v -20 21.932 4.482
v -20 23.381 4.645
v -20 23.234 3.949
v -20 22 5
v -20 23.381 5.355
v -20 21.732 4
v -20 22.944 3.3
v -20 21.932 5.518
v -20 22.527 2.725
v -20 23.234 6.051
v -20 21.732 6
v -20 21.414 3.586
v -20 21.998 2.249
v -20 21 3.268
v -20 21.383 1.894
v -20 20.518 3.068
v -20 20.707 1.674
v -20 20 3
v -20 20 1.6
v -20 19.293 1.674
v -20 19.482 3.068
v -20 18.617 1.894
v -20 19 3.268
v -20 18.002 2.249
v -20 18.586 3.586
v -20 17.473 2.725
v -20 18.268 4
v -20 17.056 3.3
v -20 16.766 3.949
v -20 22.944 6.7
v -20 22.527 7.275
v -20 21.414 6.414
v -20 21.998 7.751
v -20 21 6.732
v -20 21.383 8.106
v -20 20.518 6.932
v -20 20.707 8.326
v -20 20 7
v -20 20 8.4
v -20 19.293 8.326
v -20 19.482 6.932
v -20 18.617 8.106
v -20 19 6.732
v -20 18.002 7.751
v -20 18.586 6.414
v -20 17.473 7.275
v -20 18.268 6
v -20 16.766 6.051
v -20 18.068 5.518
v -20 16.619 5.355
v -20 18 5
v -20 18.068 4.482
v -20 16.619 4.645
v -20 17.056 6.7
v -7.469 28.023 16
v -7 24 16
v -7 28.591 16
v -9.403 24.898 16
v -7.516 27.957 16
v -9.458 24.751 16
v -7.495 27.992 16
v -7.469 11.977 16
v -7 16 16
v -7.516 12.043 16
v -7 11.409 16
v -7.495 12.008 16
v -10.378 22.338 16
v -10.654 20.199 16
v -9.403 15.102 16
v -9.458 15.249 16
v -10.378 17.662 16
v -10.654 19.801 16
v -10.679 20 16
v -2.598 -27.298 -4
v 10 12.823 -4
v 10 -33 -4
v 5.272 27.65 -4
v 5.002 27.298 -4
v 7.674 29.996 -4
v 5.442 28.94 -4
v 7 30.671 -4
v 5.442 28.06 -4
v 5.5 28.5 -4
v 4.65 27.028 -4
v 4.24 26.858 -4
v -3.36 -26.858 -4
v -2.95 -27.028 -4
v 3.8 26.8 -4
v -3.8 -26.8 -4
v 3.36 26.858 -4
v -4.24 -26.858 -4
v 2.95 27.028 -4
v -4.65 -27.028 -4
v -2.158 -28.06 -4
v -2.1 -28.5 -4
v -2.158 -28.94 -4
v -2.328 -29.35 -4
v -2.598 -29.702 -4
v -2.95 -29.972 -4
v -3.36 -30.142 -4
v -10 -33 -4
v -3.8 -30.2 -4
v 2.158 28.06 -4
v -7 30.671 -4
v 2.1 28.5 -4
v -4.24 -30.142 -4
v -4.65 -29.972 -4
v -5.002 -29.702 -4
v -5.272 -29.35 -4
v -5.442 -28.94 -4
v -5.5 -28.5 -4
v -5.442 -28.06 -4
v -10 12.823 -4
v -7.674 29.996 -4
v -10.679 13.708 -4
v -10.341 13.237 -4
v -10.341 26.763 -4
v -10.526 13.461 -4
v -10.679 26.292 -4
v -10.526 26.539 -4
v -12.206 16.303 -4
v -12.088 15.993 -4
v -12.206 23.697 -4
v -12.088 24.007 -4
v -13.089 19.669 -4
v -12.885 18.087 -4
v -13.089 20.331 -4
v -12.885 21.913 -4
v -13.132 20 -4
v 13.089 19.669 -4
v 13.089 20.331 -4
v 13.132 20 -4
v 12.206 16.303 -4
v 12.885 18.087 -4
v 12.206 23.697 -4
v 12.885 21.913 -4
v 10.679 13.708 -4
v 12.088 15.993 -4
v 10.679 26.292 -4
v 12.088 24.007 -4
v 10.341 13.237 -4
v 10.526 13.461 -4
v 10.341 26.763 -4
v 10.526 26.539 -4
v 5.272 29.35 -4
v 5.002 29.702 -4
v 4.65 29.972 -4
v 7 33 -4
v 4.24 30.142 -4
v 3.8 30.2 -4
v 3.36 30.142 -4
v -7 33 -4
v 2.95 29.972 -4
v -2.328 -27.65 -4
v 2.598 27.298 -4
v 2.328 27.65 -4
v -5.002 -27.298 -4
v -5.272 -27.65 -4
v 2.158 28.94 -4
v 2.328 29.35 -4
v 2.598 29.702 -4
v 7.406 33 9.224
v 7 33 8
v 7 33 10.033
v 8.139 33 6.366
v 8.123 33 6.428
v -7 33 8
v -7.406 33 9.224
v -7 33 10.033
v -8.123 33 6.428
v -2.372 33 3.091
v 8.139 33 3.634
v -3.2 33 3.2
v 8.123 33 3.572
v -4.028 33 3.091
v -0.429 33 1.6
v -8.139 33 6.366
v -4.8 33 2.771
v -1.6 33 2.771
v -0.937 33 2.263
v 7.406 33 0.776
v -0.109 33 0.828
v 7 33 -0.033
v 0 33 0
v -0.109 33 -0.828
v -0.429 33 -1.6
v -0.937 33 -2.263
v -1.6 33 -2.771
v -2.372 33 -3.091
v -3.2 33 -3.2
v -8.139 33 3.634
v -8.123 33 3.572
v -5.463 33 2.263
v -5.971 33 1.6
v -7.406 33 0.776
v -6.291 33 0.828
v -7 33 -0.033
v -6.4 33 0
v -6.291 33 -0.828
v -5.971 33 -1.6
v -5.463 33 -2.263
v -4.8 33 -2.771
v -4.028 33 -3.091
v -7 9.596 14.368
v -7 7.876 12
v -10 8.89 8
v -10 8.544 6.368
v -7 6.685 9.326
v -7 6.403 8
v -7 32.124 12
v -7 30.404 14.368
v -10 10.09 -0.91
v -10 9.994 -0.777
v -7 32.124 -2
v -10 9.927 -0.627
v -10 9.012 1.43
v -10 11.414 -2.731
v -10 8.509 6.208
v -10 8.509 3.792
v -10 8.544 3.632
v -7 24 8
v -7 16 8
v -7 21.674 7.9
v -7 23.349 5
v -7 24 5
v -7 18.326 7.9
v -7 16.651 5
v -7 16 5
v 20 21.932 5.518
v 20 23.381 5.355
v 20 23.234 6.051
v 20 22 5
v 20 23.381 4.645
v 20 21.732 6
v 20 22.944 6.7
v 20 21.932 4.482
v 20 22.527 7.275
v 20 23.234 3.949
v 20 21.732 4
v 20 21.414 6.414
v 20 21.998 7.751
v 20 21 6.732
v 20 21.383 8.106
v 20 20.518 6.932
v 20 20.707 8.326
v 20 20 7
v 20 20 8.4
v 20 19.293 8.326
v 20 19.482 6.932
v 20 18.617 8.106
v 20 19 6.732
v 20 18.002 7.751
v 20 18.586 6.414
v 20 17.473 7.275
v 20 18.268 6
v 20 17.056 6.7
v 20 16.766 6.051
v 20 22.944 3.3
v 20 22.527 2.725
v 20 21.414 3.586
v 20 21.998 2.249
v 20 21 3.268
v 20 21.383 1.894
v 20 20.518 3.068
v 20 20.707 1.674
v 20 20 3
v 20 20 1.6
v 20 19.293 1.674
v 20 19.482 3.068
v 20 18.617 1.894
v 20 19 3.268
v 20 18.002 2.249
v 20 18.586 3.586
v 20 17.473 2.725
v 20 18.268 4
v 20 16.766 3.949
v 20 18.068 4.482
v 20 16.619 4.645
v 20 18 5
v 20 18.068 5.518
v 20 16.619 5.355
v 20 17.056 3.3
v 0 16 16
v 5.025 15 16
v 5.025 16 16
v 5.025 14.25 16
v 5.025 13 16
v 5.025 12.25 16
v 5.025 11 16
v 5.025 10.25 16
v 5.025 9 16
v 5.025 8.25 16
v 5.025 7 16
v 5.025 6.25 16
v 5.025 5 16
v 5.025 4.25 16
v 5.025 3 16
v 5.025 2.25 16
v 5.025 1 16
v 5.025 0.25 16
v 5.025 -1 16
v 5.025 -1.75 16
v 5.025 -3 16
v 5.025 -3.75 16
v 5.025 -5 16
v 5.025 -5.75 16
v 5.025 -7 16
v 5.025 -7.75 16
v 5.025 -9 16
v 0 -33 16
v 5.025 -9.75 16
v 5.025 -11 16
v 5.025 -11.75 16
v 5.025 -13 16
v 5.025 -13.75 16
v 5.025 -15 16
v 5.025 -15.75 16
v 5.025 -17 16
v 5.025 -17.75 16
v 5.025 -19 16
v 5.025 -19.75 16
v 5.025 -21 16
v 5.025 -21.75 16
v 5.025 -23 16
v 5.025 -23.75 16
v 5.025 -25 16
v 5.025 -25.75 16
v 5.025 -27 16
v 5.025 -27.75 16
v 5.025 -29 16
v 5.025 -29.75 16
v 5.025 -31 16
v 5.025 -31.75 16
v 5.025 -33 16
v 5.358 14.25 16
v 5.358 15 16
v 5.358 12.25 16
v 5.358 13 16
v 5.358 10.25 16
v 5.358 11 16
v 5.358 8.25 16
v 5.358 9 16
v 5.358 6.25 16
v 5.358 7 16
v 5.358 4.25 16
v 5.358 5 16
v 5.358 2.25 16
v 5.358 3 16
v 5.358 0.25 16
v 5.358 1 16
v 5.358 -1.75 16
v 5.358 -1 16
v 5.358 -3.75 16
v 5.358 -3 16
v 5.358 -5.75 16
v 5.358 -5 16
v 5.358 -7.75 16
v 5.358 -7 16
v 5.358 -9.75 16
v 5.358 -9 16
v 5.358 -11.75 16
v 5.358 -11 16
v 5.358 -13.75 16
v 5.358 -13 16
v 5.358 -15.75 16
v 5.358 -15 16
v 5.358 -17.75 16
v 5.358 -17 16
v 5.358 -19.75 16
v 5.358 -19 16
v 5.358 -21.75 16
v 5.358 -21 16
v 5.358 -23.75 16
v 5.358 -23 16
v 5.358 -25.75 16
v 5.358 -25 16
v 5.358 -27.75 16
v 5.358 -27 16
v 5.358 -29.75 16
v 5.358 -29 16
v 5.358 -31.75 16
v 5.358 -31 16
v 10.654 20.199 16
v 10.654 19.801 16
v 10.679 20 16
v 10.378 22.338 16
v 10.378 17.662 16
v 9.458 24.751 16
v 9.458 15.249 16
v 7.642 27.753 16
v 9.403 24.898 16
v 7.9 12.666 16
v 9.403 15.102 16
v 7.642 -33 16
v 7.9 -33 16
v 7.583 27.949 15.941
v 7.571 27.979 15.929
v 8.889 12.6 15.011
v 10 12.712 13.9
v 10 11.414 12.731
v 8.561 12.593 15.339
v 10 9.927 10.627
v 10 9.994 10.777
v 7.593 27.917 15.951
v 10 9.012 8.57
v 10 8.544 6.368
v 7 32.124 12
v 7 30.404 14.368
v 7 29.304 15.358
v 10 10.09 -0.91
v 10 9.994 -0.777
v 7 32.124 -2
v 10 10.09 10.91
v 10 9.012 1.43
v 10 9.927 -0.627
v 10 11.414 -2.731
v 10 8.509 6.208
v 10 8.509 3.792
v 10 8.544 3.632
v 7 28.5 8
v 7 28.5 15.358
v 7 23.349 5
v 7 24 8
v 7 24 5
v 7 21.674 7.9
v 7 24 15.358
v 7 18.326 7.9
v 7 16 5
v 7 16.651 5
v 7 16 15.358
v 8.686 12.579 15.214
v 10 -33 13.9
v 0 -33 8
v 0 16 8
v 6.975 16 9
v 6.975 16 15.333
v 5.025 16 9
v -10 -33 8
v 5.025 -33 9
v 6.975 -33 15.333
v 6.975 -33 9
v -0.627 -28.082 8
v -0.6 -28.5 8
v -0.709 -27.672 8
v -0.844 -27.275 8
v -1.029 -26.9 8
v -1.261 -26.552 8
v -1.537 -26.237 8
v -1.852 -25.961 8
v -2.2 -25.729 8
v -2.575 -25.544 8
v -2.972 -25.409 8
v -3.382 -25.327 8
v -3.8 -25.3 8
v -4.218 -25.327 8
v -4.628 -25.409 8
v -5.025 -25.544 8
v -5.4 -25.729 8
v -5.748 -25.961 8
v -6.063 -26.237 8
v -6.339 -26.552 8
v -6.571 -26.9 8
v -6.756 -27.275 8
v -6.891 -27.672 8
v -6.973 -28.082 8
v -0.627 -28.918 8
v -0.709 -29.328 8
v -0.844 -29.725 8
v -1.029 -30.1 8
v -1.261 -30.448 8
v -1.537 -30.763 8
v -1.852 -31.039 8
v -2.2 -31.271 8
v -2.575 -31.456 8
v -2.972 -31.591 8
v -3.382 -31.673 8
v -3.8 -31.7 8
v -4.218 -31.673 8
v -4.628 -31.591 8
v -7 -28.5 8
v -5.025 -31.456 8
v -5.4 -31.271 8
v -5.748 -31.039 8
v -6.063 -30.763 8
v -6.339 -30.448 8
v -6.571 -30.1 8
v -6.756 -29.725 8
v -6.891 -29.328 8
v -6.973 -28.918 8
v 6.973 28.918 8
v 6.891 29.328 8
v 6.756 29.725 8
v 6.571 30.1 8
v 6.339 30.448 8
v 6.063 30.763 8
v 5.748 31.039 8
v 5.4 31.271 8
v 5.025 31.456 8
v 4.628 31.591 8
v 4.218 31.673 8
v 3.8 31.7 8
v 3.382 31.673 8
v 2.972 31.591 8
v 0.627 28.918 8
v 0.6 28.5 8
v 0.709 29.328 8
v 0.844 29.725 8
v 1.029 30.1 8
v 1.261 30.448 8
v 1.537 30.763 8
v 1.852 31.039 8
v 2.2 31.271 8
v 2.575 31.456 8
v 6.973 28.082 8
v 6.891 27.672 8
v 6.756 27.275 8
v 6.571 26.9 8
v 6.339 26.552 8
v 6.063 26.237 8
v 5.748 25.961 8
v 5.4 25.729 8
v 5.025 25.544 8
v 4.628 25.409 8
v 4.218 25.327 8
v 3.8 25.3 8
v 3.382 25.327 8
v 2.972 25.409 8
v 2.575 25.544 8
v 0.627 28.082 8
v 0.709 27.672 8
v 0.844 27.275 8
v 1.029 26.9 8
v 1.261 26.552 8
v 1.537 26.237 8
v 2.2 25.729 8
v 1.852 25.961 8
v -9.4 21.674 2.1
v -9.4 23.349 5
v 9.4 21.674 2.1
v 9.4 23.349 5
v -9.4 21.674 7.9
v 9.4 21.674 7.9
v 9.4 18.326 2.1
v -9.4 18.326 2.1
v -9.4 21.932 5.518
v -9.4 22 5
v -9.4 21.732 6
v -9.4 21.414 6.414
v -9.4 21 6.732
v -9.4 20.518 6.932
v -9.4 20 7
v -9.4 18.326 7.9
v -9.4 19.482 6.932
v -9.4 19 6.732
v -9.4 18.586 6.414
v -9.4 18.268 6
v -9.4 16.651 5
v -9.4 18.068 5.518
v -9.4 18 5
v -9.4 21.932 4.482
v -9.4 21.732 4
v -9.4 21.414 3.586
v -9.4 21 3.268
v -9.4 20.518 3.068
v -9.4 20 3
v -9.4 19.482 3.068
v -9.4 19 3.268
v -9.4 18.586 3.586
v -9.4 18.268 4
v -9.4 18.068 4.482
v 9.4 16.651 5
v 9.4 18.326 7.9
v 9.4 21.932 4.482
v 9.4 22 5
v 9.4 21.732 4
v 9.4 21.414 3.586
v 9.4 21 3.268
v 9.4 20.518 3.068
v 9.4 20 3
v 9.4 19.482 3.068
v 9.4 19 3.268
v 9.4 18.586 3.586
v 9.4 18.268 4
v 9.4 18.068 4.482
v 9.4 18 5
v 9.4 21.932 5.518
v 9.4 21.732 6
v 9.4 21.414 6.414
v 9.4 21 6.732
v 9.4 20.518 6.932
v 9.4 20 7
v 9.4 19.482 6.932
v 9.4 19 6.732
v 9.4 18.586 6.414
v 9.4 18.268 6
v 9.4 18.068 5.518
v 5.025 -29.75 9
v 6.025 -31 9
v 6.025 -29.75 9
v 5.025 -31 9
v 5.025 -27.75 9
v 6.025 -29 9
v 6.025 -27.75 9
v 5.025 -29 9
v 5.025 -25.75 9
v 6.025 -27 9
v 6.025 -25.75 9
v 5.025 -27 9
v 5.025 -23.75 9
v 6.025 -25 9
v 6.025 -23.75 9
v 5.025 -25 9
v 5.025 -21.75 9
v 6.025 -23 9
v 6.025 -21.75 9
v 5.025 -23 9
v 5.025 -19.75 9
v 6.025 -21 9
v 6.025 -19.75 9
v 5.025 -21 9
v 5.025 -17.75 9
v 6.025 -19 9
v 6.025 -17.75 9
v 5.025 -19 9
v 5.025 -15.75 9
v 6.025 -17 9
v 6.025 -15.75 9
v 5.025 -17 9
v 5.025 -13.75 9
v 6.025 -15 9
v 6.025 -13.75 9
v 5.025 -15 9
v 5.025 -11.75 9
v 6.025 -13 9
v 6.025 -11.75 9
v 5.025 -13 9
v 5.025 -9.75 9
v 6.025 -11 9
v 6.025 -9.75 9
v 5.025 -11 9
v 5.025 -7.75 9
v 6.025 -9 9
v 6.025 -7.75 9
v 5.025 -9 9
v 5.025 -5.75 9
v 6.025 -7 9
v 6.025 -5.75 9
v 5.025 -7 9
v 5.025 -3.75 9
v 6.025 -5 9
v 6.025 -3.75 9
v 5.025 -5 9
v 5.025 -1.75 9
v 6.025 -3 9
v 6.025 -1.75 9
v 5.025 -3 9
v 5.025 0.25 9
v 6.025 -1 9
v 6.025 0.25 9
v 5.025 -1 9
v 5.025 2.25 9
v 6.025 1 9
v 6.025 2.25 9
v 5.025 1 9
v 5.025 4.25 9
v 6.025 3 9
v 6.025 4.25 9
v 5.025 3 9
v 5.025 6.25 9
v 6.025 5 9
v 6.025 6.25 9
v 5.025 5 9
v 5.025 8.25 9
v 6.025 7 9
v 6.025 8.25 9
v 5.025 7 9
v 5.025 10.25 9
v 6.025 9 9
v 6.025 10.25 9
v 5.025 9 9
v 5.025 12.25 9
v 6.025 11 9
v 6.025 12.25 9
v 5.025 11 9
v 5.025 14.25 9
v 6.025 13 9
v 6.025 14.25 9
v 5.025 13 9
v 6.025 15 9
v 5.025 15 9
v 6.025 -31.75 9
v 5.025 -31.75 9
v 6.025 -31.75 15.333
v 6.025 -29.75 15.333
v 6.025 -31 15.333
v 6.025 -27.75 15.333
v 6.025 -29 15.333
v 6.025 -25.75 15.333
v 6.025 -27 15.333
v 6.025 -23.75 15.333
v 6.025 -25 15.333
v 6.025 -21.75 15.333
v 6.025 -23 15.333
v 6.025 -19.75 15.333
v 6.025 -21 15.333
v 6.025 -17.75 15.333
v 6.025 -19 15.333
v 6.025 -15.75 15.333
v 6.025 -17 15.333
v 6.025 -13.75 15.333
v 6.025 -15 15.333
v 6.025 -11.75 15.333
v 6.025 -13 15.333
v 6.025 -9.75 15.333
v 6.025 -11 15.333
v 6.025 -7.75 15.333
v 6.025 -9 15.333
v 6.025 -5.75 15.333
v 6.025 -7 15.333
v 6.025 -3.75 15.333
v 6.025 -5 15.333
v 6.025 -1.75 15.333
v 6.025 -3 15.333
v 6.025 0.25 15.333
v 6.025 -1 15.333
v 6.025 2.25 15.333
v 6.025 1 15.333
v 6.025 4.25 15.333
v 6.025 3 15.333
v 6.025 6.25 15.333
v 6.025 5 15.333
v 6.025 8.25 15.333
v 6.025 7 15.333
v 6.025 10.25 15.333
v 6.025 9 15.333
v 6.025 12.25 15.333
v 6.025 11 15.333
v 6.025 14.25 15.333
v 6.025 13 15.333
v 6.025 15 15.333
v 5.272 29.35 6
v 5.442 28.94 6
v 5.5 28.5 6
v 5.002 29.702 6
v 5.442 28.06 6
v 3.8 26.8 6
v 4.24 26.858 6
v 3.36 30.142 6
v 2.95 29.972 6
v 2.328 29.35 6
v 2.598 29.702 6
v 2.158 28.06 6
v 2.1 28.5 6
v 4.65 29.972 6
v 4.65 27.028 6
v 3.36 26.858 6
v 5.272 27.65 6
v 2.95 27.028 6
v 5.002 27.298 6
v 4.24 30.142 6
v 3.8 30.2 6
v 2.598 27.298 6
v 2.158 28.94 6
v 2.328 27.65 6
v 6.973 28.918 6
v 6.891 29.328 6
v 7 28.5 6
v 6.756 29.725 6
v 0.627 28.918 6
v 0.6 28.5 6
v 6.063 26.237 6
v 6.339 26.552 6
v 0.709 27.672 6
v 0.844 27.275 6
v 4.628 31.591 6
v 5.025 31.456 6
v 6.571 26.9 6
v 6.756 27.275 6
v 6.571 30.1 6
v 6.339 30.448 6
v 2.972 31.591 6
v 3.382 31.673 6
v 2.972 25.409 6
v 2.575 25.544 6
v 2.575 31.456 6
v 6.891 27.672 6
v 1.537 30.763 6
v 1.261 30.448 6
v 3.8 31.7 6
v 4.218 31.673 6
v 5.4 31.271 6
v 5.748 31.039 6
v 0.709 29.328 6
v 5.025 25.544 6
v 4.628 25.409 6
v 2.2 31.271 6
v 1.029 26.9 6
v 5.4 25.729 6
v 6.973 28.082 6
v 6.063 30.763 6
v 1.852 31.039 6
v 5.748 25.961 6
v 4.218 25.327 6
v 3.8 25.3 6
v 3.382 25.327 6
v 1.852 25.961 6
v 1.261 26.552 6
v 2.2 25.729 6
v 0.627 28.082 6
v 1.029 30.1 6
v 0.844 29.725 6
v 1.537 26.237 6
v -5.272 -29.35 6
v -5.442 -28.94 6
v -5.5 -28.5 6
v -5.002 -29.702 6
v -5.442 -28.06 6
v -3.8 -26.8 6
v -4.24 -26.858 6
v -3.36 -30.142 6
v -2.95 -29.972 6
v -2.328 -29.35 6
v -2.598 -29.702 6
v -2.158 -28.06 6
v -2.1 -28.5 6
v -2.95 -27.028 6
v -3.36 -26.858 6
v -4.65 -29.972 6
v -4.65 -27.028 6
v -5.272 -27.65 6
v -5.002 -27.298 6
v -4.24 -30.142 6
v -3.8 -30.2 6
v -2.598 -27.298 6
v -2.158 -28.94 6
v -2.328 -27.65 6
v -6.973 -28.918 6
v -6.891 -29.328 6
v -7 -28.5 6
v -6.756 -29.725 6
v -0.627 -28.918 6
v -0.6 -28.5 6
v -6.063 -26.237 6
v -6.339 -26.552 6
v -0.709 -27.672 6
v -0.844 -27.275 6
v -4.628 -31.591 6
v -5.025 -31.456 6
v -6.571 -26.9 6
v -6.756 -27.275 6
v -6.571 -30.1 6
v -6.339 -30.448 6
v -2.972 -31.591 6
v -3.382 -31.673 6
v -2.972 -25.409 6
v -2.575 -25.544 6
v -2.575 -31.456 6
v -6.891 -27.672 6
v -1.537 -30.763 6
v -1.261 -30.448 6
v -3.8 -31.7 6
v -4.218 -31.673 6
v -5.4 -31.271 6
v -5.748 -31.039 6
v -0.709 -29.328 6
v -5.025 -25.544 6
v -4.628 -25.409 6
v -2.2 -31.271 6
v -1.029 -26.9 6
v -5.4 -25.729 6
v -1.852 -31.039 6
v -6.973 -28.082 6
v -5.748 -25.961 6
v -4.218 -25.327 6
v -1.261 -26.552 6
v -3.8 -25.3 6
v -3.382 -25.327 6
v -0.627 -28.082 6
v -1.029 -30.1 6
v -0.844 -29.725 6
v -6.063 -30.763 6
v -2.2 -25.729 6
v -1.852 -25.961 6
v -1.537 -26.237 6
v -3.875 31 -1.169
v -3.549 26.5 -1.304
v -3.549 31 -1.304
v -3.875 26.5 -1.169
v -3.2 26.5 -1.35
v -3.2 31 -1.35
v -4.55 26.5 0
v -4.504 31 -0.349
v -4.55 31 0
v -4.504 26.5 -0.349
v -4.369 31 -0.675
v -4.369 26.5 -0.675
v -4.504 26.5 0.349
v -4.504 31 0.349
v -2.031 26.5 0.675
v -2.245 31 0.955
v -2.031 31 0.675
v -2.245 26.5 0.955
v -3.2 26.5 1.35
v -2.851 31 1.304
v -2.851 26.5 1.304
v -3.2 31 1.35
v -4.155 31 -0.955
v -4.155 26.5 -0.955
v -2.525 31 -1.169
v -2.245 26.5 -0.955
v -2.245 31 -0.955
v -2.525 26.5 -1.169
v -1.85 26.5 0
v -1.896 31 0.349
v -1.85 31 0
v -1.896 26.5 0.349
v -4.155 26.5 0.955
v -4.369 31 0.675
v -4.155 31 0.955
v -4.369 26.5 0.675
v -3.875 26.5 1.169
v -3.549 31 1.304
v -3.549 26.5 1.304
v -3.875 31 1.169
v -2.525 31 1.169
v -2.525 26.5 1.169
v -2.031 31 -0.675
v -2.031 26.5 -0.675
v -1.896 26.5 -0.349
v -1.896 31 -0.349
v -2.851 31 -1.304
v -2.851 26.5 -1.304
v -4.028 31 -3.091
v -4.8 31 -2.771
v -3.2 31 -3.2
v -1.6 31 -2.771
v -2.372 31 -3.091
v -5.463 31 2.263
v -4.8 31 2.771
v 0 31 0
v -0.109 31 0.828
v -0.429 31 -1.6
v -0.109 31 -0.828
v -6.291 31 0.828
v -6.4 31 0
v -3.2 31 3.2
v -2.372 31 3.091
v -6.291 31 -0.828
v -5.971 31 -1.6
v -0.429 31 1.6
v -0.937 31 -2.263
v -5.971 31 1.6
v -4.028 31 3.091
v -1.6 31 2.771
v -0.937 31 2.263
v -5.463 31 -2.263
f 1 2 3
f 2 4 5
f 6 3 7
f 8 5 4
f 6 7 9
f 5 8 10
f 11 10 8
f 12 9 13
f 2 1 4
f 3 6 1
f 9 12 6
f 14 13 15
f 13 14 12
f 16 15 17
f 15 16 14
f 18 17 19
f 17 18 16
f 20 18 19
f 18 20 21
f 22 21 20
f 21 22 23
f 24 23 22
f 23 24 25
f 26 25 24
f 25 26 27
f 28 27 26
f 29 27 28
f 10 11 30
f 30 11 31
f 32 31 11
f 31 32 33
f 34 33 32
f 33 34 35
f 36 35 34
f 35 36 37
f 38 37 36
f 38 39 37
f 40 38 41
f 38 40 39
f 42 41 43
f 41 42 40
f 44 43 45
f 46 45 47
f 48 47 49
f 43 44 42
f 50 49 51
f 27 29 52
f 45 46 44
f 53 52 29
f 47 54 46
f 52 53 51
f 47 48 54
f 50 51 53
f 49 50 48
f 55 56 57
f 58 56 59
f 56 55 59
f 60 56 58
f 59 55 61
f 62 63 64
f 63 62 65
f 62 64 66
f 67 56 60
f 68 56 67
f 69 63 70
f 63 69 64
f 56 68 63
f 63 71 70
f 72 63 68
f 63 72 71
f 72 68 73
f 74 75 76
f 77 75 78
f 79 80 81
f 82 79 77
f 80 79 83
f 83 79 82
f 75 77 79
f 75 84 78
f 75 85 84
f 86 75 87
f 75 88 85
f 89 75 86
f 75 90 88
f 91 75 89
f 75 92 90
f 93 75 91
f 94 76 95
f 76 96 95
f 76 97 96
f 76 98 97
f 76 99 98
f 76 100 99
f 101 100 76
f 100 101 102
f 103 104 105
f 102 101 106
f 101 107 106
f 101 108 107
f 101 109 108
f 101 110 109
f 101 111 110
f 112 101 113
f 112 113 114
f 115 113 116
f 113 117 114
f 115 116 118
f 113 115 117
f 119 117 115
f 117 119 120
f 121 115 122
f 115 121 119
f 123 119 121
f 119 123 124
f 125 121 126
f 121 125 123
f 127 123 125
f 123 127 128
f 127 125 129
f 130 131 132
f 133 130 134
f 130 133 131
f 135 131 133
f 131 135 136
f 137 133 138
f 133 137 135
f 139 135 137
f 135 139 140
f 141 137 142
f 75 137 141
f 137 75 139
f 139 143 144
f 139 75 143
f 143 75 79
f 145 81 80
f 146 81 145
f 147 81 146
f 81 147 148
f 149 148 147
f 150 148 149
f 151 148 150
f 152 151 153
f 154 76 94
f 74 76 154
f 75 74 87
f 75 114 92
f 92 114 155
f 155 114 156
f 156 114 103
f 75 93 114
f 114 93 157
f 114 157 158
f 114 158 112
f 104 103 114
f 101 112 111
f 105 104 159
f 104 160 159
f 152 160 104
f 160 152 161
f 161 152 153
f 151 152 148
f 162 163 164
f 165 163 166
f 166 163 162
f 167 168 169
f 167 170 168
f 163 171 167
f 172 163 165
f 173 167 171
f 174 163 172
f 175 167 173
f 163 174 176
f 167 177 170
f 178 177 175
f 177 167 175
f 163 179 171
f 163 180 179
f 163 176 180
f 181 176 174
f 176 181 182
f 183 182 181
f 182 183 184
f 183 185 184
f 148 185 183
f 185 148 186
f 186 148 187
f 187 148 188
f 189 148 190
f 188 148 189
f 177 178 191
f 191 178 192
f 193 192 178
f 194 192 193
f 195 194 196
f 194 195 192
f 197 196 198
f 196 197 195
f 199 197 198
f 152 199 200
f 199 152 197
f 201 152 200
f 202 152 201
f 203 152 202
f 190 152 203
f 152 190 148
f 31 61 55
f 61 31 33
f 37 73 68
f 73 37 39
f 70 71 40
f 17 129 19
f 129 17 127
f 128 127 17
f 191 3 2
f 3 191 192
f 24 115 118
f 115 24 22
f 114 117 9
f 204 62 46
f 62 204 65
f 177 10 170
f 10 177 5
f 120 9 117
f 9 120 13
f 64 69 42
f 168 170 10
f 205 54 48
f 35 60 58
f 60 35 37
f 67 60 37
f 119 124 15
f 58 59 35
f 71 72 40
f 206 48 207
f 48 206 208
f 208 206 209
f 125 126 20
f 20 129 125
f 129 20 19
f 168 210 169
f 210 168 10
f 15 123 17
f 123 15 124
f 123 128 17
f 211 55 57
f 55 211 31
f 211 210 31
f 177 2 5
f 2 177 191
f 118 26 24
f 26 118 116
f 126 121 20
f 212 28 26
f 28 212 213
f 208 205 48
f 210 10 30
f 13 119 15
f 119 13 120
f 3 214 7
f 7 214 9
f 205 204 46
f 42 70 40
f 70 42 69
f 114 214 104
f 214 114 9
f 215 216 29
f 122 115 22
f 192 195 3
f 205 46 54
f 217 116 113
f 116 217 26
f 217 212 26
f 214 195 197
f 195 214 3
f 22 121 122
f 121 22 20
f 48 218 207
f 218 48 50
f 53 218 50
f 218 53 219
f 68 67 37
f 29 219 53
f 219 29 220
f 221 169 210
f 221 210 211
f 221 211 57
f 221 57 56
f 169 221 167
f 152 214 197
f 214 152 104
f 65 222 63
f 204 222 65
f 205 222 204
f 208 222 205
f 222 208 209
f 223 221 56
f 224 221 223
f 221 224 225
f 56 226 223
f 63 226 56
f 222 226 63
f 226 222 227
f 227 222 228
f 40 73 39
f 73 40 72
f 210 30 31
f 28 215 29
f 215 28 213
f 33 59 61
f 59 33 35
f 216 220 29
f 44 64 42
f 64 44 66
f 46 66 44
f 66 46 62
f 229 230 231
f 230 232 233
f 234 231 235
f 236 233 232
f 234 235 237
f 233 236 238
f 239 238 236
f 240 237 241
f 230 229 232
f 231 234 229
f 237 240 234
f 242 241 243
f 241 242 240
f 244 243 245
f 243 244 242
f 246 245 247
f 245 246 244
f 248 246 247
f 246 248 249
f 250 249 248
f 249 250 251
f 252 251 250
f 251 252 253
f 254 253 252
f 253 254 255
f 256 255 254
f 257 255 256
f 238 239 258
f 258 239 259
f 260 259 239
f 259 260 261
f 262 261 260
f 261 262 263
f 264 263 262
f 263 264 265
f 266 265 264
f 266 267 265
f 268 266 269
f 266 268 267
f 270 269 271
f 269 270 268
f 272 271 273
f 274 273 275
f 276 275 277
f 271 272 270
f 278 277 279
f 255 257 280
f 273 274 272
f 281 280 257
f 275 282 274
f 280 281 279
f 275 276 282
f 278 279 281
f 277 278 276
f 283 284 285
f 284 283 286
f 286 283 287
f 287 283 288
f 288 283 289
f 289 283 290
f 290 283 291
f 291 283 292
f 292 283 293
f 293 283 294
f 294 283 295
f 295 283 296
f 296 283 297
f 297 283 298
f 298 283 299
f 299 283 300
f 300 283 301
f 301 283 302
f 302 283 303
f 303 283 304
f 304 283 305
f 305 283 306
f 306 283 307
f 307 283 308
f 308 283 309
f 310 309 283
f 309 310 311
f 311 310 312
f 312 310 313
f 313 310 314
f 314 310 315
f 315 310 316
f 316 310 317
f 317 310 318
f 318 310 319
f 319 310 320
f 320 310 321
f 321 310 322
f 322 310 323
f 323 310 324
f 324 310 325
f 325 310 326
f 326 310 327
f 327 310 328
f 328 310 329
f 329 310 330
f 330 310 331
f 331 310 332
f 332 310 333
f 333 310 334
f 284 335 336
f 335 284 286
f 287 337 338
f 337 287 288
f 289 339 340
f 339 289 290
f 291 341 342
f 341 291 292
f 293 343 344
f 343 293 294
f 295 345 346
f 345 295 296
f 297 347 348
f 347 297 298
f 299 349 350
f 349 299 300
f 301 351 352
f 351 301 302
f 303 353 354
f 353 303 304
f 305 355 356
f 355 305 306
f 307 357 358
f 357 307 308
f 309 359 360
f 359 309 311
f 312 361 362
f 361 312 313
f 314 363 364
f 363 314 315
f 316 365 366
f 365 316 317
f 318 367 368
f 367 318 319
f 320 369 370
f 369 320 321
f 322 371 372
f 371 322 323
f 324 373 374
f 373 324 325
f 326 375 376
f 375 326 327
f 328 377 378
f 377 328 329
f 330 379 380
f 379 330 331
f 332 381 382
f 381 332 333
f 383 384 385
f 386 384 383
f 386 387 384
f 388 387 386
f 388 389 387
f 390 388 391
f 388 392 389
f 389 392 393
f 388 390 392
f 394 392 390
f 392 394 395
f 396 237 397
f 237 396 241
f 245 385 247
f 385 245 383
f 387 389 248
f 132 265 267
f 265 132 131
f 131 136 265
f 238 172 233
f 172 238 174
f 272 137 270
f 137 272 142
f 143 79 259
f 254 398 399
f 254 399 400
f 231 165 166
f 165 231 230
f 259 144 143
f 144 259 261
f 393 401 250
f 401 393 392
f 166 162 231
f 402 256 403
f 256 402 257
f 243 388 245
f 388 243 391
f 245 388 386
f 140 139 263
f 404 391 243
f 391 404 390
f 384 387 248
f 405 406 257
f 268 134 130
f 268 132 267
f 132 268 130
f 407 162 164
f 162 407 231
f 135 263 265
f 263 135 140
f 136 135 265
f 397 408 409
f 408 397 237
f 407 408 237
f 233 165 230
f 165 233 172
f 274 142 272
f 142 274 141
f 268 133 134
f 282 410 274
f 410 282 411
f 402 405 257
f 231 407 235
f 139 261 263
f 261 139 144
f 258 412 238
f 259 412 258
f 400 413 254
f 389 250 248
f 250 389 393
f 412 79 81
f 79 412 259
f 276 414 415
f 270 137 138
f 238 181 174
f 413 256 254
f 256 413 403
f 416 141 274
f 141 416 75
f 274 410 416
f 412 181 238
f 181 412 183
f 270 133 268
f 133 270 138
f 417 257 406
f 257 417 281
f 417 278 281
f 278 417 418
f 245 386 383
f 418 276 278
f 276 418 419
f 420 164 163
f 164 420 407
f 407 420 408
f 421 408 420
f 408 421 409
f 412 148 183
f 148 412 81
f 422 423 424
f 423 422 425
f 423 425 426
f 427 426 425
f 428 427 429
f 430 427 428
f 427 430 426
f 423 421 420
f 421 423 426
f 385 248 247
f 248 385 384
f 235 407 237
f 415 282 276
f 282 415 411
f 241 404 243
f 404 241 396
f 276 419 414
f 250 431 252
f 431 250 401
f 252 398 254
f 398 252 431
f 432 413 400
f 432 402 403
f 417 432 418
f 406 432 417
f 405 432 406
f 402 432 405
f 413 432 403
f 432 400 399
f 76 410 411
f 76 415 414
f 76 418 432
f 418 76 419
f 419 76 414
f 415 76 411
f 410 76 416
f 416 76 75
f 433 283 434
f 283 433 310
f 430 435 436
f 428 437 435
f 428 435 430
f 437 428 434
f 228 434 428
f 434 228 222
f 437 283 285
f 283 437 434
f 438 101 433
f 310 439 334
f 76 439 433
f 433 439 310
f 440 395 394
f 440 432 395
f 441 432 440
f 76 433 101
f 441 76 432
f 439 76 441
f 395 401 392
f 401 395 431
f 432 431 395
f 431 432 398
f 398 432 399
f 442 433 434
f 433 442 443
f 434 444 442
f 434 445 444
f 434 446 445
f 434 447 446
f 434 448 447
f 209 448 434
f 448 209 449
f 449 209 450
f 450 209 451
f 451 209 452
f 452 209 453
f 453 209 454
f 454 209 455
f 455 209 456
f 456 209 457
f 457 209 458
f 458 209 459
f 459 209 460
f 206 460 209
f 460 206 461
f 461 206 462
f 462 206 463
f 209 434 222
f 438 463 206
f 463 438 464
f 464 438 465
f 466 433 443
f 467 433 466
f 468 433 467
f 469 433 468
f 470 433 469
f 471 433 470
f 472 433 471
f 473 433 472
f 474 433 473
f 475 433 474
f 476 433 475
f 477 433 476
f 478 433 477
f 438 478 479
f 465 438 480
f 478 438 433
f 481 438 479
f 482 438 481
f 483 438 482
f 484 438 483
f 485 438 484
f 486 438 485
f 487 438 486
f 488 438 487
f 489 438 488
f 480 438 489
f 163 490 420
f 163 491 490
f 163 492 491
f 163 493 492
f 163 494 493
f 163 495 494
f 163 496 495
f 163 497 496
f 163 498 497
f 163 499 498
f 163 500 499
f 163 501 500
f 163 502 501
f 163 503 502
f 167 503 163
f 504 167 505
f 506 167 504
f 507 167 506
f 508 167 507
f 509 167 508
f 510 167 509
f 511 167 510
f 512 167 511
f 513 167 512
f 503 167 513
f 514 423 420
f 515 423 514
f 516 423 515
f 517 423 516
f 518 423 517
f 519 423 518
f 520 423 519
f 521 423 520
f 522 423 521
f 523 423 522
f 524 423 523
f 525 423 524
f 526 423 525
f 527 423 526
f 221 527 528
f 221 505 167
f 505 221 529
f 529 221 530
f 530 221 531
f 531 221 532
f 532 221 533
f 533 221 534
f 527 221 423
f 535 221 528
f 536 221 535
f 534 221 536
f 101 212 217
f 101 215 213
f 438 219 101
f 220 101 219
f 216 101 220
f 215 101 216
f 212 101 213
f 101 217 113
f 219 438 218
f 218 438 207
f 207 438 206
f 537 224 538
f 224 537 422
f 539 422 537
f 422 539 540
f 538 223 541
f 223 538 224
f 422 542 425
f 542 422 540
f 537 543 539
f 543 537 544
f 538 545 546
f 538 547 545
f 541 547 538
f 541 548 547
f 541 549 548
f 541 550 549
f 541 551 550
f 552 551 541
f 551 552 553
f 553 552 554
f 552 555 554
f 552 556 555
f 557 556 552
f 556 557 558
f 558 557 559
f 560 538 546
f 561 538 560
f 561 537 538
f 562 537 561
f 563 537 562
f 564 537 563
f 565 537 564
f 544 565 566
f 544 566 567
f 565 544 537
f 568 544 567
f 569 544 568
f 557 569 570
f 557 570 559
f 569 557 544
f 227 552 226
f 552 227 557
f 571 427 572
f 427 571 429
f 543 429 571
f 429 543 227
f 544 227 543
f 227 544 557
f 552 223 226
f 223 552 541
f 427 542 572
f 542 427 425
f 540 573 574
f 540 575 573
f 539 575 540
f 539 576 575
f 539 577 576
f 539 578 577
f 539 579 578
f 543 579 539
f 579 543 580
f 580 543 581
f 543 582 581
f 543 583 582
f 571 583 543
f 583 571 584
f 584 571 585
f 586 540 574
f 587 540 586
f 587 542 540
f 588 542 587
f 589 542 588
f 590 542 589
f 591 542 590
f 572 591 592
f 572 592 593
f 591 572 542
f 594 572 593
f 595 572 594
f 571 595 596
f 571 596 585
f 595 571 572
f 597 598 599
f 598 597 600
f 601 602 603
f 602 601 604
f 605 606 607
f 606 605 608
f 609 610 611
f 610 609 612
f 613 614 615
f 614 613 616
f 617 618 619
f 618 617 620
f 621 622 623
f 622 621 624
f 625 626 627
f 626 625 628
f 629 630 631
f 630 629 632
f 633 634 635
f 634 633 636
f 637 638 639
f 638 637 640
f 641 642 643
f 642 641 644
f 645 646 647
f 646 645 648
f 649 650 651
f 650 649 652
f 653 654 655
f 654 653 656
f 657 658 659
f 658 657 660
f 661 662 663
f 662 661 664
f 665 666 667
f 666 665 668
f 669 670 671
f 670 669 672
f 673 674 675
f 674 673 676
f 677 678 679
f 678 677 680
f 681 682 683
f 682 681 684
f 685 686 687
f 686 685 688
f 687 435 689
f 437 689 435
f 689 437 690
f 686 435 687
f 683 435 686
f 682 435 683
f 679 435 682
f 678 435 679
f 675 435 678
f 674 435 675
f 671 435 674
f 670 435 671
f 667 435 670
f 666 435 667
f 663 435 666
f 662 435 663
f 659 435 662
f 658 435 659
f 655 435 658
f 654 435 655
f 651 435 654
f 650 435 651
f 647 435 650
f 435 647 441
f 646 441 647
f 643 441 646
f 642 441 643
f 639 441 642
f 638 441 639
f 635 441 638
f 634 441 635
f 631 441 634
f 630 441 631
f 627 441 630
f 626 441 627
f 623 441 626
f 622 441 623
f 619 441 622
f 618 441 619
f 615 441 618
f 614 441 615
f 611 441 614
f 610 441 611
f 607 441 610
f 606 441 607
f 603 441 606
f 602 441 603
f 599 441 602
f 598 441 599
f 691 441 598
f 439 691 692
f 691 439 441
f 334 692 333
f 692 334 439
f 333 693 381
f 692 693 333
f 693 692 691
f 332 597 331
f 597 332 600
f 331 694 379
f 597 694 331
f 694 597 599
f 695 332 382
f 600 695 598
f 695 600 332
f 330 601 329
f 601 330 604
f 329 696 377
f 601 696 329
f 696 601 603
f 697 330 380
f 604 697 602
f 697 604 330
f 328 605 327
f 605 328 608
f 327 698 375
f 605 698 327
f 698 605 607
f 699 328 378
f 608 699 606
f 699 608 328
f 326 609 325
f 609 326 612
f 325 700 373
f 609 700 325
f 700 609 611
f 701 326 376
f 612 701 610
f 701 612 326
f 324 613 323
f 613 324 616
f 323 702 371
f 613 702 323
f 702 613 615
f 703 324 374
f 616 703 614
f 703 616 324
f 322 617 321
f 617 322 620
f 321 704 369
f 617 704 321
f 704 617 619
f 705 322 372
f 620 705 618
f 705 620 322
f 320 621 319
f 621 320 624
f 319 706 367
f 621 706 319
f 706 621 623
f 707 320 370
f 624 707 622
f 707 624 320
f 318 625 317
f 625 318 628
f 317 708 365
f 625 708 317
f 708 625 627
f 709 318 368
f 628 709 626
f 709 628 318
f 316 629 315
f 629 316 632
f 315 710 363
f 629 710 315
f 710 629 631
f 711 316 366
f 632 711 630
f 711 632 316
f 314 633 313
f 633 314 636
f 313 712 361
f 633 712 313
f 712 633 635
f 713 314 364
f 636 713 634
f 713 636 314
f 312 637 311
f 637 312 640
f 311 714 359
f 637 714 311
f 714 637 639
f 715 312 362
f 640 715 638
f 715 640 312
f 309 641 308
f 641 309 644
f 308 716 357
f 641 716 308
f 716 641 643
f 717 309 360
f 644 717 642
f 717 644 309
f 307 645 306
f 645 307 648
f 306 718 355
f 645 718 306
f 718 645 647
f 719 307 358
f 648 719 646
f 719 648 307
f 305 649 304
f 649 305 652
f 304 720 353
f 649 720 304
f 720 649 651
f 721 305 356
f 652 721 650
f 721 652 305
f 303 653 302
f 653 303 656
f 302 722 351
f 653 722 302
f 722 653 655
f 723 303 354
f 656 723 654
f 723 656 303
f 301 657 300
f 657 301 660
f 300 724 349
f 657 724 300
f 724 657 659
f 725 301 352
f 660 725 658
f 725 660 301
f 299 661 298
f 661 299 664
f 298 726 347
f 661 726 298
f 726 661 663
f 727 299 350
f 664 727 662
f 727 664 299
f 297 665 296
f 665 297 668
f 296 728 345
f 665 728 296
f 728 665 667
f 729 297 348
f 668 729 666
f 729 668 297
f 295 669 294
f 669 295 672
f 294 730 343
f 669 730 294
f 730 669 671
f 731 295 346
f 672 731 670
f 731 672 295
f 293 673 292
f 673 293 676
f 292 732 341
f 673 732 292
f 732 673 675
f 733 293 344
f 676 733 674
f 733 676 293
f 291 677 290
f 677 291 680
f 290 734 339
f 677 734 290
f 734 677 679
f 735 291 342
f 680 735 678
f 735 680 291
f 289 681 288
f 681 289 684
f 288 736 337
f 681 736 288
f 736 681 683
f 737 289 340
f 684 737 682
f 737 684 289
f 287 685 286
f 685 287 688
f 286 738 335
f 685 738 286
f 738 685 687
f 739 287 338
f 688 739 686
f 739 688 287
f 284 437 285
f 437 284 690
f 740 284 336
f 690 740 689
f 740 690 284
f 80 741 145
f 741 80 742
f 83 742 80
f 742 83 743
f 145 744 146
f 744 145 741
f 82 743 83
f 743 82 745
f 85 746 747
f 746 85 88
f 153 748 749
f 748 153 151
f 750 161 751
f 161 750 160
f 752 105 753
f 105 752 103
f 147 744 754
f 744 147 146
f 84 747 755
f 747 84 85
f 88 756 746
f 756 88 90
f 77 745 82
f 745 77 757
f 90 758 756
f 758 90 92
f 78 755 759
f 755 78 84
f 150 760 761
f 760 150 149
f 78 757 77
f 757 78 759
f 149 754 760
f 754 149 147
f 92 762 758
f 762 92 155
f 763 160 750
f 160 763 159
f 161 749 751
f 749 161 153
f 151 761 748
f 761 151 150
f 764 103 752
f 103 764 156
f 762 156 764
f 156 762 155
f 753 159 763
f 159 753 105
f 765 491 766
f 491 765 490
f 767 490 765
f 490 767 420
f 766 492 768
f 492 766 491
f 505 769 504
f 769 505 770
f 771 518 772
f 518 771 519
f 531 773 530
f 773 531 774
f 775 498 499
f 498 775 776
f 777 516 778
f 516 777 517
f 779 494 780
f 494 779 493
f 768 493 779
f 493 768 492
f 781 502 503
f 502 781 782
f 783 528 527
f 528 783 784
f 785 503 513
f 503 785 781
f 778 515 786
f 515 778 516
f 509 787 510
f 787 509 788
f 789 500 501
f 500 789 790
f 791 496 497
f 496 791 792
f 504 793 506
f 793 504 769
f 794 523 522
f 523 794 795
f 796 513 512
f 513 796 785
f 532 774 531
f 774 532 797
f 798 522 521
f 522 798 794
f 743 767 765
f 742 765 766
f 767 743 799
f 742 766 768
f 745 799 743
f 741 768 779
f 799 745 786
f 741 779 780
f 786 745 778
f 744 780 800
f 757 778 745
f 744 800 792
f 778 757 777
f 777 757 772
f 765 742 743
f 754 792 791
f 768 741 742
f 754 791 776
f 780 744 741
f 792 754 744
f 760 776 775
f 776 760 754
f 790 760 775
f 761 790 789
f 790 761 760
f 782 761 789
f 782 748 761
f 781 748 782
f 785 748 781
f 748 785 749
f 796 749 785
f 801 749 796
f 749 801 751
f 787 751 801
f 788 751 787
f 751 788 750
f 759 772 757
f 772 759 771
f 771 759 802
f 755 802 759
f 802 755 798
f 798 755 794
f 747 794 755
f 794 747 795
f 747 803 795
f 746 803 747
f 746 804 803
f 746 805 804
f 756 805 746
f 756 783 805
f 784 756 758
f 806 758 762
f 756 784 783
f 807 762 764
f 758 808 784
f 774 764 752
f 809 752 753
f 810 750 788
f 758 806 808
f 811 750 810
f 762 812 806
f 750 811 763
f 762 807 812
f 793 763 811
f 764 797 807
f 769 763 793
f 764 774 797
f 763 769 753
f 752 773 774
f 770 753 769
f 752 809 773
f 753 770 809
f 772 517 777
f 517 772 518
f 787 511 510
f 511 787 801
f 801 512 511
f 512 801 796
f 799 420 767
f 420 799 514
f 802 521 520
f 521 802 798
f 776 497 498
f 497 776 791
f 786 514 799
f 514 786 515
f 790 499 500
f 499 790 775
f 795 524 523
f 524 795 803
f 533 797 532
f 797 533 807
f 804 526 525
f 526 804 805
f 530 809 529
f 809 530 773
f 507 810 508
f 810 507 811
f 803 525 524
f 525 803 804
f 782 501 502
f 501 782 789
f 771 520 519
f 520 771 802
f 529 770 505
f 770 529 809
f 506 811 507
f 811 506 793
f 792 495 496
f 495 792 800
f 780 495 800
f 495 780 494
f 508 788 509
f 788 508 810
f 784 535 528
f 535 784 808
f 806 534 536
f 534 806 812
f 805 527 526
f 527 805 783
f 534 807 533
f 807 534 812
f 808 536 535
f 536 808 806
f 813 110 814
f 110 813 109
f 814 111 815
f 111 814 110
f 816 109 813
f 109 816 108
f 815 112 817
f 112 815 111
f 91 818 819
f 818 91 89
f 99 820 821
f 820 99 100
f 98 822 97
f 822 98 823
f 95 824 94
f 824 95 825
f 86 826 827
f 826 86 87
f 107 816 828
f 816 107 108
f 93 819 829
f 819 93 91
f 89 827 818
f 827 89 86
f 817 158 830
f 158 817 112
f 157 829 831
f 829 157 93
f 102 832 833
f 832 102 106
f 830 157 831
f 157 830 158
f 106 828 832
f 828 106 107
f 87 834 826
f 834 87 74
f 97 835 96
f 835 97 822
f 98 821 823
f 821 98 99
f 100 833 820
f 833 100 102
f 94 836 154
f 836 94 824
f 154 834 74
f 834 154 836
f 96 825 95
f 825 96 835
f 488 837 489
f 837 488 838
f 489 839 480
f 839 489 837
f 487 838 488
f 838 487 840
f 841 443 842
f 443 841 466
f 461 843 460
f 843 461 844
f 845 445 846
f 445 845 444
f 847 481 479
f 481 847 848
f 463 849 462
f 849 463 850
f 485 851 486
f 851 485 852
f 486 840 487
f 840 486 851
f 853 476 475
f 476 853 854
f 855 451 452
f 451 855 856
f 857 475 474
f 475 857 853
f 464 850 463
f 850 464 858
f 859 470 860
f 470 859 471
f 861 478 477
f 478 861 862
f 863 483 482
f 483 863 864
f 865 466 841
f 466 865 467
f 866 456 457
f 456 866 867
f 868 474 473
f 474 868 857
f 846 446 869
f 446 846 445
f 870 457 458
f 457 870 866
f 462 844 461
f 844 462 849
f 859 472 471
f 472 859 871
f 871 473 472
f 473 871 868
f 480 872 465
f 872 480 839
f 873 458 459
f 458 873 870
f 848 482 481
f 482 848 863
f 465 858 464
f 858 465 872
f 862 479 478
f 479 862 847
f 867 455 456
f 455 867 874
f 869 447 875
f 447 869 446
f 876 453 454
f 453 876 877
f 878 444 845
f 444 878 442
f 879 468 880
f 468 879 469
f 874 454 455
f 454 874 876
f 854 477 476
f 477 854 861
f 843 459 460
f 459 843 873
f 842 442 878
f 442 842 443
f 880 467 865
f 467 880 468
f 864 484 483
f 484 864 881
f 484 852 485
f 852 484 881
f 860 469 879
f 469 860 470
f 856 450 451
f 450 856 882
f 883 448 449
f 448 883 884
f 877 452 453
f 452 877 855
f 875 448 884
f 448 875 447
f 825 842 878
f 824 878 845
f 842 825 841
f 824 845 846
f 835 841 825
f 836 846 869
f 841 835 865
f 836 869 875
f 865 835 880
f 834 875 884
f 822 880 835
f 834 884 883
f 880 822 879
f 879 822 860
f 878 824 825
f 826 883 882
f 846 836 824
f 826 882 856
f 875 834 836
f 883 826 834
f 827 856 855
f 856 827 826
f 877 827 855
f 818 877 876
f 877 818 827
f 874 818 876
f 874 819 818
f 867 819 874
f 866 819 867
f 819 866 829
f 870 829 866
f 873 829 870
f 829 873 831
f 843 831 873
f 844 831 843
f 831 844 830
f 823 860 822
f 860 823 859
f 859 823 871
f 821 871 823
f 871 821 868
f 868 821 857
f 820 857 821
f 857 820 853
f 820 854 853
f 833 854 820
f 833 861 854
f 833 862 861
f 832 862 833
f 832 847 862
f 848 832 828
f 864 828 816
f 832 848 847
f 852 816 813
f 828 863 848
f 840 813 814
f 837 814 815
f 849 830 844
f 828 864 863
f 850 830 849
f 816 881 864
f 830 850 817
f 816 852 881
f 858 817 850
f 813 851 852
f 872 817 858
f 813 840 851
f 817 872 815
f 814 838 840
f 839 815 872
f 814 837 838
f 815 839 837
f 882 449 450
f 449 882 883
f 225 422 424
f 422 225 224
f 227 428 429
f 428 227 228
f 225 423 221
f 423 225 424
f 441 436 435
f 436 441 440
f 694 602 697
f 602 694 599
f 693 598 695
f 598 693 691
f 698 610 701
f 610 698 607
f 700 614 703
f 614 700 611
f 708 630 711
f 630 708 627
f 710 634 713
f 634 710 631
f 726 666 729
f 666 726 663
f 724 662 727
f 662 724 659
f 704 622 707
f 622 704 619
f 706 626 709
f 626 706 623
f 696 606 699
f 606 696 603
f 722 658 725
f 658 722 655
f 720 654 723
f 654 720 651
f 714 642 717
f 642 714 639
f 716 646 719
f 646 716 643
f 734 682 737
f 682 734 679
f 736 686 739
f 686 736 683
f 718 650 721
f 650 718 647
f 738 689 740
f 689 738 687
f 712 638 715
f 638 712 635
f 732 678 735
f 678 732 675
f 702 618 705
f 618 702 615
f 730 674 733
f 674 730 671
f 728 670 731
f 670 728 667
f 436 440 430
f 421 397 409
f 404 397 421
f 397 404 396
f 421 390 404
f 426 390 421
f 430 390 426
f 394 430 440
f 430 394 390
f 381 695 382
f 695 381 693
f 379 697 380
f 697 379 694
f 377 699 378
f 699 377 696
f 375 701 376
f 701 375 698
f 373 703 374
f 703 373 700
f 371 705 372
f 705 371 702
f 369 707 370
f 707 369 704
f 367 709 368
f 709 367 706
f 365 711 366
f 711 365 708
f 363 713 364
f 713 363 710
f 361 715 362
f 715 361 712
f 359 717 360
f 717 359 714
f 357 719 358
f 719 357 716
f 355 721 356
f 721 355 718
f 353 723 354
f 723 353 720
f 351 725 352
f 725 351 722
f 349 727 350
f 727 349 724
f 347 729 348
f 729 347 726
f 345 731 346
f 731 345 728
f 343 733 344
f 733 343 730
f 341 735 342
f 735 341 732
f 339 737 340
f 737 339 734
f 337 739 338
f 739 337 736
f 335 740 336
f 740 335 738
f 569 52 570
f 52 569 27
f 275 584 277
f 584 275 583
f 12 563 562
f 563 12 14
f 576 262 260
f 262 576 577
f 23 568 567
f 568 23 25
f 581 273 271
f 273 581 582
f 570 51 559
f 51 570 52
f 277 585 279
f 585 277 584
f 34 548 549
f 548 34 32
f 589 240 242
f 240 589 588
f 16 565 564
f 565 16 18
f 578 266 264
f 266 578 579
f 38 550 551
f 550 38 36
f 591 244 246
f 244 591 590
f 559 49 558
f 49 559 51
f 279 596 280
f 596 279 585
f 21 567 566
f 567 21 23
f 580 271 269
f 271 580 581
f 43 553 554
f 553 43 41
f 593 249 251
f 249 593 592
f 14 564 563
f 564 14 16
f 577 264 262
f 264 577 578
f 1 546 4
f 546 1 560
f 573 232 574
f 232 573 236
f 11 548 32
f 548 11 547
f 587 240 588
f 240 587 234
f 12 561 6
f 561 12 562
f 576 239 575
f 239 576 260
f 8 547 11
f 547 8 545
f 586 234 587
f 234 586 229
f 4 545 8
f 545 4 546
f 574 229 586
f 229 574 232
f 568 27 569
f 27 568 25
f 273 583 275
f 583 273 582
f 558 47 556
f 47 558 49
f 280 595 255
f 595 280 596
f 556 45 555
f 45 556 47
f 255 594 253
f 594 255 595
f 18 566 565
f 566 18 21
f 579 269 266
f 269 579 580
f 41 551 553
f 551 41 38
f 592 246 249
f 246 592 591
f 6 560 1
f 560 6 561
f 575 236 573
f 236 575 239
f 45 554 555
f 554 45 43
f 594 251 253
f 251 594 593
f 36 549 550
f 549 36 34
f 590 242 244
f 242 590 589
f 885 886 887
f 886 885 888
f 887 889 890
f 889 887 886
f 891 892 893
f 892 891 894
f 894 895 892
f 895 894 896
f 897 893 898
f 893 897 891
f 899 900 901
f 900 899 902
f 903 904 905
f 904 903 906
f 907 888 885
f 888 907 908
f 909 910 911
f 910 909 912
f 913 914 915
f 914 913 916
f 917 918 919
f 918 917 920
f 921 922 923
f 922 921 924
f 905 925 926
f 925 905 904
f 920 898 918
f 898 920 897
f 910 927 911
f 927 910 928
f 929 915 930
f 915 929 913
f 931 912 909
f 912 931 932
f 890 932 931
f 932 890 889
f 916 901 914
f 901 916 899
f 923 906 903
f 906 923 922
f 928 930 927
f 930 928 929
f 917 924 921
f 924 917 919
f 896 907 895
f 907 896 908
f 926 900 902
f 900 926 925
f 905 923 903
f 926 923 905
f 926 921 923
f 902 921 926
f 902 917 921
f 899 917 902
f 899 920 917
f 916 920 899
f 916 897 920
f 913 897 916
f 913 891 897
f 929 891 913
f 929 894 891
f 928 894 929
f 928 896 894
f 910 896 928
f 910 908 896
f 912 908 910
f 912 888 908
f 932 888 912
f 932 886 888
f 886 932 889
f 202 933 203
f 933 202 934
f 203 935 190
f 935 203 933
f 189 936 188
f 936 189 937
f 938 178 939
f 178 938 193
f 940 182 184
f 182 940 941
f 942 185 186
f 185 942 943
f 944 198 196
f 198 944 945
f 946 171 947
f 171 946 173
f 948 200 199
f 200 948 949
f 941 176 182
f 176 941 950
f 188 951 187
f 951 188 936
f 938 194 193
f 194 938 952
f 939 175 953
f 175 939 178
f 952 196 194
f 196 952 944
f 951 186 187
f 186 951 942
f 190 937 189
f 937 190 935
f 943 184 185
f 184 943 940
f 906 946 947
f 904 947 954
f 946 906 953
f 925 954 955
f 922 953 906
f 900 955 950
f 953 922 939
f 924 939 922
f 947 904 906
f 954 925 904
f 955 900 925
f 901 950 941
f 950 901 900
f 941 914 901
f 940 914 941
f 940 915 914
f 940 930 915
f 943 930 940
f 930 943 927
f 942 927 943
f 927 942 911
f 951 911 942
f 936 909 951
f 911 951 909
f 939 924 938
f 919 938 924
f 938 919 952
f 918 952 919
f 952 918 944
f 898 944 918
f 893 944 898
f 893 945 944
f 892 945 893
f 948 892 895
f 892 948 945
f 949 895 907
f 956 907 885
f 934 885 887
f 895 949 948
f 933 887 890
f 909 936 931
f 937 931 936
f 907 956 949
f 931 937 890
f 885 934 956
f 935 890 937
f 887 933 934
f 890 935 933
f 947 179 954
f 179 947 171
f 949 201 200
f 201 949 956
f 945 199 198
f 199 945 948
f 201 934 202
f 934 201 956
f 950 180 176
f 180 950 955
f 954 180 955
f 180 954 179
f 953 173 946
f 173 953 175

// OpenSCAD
separation = 40;

width = 20;
height = 66;

horn_thickness = 10;
horn_x = 7;
horn_y = 20;

belt_width = 6+1;
belt_x = 6.5;
belt_z = 10-1;
belt_thickness = 0.95;

thickness = belt_z +3;

m3_radius = 3.4/2;
m3_nut_w  = 5.5+0.3;
m3_nut_h = 2.4;

module carriage() {
	difference() {
	union() {
      // Ball joint mount horns.
      for (x = [-1, 1]) {
        scale([x, 1, 1]) intersection() {
          translate([0, 0, horn_thickness/2+1])
            // Enclosing cube
            cube([separation, height, horn_thickness+10], center=true);
          translate([horn_x, horn_y, horn_thickness/2]) rotate([0, 90, 0])
            # cylinder(r1=14, r2=3.4, h=separation/2-horn_x);
        }
      }

      // Main Body
      translate([-width/2, -height/2, -4])
			cube([width, height-6, thickness]);
      // Body Top
      translate([-horn_x, horn_y+4, -4])
			cube([horn_x*2, height/2-horn_y-4, thickness]);

		difference() {
		   translate([0, -height/2, 0])
   			cube([width/2, height/2+horn_y-4, belt_z+belt_width]);
		   translate([belt_x+1.4, -height/2, belt_z+belt_width])
   		rotate([0,45,0]) cube([width/2, height/2+horn_y-4, belt_z+belt_width]);
		}
	}

    // Locking Nut Channel
	translate([-7,horn_y-4,horn_thickness/2])
		#cube([14,8,belt_z+belt_width]);
	for(s=[1,-1]) scale([s,1,1])
	translate([-7-m3_nut_h,horn_y,horn_thickness/2])
	rotate([0,90,0]) 	rotate([0,0,30])
		cylinder(r=m3_nut_w/2*1.154734411, h=m3_nut_h+7.1, $fn=6);

    // Belt Guide
	translate([belt_x-belt_thickness/2, -height/2, belt_z])
		cube([belt_thickness, height, belt_width]);

    // Teeth
	for(y=[-height/2:2:horn_y]) {
		translate([belt_x-belt_thickness/2-1.0, y, belt_z])
			cube([1.1,1.25,belt_width+2]);
	}
	translate([belt_x, 0, belt_z+belt_width])
	rotate([0,45,0]) cube([belt_thickness*1.7,height,belt_thickness*1.7], center=true);

    // Arm Mounting Holes
	translate([0,horn_y,horn_thickness/2])
	rotate([0,90,0])
		cylinder(r=2, h=separation+1, center=true,$fn=24);

    // Mounting Holes
	for(a=[0,180]) rotate([0,0,a]) {
	translate([width/4-1.2,height/2-4.5,-4]) 
		cylinder(r=m3_radius,h=20,$fn=24);
	translate([width/4-1.2,height/2-4.5,6]) 
		cylinder(r=3.2,h=belt_width+belt_z+3,$fn=48);
	}
    
    
    //Z Axis Screw
	translate([-3.2,31,0])
	rotate([0,90,90])
		# cylinder(r=2.7/2, h=9, center=true,$fn=24);
	translate([-3.2,33,0])
	rotate([0,90,90])    
		# cylinder(r=3.2, h=4, center=true,$fn=24);
	


	}
}

carriage();
